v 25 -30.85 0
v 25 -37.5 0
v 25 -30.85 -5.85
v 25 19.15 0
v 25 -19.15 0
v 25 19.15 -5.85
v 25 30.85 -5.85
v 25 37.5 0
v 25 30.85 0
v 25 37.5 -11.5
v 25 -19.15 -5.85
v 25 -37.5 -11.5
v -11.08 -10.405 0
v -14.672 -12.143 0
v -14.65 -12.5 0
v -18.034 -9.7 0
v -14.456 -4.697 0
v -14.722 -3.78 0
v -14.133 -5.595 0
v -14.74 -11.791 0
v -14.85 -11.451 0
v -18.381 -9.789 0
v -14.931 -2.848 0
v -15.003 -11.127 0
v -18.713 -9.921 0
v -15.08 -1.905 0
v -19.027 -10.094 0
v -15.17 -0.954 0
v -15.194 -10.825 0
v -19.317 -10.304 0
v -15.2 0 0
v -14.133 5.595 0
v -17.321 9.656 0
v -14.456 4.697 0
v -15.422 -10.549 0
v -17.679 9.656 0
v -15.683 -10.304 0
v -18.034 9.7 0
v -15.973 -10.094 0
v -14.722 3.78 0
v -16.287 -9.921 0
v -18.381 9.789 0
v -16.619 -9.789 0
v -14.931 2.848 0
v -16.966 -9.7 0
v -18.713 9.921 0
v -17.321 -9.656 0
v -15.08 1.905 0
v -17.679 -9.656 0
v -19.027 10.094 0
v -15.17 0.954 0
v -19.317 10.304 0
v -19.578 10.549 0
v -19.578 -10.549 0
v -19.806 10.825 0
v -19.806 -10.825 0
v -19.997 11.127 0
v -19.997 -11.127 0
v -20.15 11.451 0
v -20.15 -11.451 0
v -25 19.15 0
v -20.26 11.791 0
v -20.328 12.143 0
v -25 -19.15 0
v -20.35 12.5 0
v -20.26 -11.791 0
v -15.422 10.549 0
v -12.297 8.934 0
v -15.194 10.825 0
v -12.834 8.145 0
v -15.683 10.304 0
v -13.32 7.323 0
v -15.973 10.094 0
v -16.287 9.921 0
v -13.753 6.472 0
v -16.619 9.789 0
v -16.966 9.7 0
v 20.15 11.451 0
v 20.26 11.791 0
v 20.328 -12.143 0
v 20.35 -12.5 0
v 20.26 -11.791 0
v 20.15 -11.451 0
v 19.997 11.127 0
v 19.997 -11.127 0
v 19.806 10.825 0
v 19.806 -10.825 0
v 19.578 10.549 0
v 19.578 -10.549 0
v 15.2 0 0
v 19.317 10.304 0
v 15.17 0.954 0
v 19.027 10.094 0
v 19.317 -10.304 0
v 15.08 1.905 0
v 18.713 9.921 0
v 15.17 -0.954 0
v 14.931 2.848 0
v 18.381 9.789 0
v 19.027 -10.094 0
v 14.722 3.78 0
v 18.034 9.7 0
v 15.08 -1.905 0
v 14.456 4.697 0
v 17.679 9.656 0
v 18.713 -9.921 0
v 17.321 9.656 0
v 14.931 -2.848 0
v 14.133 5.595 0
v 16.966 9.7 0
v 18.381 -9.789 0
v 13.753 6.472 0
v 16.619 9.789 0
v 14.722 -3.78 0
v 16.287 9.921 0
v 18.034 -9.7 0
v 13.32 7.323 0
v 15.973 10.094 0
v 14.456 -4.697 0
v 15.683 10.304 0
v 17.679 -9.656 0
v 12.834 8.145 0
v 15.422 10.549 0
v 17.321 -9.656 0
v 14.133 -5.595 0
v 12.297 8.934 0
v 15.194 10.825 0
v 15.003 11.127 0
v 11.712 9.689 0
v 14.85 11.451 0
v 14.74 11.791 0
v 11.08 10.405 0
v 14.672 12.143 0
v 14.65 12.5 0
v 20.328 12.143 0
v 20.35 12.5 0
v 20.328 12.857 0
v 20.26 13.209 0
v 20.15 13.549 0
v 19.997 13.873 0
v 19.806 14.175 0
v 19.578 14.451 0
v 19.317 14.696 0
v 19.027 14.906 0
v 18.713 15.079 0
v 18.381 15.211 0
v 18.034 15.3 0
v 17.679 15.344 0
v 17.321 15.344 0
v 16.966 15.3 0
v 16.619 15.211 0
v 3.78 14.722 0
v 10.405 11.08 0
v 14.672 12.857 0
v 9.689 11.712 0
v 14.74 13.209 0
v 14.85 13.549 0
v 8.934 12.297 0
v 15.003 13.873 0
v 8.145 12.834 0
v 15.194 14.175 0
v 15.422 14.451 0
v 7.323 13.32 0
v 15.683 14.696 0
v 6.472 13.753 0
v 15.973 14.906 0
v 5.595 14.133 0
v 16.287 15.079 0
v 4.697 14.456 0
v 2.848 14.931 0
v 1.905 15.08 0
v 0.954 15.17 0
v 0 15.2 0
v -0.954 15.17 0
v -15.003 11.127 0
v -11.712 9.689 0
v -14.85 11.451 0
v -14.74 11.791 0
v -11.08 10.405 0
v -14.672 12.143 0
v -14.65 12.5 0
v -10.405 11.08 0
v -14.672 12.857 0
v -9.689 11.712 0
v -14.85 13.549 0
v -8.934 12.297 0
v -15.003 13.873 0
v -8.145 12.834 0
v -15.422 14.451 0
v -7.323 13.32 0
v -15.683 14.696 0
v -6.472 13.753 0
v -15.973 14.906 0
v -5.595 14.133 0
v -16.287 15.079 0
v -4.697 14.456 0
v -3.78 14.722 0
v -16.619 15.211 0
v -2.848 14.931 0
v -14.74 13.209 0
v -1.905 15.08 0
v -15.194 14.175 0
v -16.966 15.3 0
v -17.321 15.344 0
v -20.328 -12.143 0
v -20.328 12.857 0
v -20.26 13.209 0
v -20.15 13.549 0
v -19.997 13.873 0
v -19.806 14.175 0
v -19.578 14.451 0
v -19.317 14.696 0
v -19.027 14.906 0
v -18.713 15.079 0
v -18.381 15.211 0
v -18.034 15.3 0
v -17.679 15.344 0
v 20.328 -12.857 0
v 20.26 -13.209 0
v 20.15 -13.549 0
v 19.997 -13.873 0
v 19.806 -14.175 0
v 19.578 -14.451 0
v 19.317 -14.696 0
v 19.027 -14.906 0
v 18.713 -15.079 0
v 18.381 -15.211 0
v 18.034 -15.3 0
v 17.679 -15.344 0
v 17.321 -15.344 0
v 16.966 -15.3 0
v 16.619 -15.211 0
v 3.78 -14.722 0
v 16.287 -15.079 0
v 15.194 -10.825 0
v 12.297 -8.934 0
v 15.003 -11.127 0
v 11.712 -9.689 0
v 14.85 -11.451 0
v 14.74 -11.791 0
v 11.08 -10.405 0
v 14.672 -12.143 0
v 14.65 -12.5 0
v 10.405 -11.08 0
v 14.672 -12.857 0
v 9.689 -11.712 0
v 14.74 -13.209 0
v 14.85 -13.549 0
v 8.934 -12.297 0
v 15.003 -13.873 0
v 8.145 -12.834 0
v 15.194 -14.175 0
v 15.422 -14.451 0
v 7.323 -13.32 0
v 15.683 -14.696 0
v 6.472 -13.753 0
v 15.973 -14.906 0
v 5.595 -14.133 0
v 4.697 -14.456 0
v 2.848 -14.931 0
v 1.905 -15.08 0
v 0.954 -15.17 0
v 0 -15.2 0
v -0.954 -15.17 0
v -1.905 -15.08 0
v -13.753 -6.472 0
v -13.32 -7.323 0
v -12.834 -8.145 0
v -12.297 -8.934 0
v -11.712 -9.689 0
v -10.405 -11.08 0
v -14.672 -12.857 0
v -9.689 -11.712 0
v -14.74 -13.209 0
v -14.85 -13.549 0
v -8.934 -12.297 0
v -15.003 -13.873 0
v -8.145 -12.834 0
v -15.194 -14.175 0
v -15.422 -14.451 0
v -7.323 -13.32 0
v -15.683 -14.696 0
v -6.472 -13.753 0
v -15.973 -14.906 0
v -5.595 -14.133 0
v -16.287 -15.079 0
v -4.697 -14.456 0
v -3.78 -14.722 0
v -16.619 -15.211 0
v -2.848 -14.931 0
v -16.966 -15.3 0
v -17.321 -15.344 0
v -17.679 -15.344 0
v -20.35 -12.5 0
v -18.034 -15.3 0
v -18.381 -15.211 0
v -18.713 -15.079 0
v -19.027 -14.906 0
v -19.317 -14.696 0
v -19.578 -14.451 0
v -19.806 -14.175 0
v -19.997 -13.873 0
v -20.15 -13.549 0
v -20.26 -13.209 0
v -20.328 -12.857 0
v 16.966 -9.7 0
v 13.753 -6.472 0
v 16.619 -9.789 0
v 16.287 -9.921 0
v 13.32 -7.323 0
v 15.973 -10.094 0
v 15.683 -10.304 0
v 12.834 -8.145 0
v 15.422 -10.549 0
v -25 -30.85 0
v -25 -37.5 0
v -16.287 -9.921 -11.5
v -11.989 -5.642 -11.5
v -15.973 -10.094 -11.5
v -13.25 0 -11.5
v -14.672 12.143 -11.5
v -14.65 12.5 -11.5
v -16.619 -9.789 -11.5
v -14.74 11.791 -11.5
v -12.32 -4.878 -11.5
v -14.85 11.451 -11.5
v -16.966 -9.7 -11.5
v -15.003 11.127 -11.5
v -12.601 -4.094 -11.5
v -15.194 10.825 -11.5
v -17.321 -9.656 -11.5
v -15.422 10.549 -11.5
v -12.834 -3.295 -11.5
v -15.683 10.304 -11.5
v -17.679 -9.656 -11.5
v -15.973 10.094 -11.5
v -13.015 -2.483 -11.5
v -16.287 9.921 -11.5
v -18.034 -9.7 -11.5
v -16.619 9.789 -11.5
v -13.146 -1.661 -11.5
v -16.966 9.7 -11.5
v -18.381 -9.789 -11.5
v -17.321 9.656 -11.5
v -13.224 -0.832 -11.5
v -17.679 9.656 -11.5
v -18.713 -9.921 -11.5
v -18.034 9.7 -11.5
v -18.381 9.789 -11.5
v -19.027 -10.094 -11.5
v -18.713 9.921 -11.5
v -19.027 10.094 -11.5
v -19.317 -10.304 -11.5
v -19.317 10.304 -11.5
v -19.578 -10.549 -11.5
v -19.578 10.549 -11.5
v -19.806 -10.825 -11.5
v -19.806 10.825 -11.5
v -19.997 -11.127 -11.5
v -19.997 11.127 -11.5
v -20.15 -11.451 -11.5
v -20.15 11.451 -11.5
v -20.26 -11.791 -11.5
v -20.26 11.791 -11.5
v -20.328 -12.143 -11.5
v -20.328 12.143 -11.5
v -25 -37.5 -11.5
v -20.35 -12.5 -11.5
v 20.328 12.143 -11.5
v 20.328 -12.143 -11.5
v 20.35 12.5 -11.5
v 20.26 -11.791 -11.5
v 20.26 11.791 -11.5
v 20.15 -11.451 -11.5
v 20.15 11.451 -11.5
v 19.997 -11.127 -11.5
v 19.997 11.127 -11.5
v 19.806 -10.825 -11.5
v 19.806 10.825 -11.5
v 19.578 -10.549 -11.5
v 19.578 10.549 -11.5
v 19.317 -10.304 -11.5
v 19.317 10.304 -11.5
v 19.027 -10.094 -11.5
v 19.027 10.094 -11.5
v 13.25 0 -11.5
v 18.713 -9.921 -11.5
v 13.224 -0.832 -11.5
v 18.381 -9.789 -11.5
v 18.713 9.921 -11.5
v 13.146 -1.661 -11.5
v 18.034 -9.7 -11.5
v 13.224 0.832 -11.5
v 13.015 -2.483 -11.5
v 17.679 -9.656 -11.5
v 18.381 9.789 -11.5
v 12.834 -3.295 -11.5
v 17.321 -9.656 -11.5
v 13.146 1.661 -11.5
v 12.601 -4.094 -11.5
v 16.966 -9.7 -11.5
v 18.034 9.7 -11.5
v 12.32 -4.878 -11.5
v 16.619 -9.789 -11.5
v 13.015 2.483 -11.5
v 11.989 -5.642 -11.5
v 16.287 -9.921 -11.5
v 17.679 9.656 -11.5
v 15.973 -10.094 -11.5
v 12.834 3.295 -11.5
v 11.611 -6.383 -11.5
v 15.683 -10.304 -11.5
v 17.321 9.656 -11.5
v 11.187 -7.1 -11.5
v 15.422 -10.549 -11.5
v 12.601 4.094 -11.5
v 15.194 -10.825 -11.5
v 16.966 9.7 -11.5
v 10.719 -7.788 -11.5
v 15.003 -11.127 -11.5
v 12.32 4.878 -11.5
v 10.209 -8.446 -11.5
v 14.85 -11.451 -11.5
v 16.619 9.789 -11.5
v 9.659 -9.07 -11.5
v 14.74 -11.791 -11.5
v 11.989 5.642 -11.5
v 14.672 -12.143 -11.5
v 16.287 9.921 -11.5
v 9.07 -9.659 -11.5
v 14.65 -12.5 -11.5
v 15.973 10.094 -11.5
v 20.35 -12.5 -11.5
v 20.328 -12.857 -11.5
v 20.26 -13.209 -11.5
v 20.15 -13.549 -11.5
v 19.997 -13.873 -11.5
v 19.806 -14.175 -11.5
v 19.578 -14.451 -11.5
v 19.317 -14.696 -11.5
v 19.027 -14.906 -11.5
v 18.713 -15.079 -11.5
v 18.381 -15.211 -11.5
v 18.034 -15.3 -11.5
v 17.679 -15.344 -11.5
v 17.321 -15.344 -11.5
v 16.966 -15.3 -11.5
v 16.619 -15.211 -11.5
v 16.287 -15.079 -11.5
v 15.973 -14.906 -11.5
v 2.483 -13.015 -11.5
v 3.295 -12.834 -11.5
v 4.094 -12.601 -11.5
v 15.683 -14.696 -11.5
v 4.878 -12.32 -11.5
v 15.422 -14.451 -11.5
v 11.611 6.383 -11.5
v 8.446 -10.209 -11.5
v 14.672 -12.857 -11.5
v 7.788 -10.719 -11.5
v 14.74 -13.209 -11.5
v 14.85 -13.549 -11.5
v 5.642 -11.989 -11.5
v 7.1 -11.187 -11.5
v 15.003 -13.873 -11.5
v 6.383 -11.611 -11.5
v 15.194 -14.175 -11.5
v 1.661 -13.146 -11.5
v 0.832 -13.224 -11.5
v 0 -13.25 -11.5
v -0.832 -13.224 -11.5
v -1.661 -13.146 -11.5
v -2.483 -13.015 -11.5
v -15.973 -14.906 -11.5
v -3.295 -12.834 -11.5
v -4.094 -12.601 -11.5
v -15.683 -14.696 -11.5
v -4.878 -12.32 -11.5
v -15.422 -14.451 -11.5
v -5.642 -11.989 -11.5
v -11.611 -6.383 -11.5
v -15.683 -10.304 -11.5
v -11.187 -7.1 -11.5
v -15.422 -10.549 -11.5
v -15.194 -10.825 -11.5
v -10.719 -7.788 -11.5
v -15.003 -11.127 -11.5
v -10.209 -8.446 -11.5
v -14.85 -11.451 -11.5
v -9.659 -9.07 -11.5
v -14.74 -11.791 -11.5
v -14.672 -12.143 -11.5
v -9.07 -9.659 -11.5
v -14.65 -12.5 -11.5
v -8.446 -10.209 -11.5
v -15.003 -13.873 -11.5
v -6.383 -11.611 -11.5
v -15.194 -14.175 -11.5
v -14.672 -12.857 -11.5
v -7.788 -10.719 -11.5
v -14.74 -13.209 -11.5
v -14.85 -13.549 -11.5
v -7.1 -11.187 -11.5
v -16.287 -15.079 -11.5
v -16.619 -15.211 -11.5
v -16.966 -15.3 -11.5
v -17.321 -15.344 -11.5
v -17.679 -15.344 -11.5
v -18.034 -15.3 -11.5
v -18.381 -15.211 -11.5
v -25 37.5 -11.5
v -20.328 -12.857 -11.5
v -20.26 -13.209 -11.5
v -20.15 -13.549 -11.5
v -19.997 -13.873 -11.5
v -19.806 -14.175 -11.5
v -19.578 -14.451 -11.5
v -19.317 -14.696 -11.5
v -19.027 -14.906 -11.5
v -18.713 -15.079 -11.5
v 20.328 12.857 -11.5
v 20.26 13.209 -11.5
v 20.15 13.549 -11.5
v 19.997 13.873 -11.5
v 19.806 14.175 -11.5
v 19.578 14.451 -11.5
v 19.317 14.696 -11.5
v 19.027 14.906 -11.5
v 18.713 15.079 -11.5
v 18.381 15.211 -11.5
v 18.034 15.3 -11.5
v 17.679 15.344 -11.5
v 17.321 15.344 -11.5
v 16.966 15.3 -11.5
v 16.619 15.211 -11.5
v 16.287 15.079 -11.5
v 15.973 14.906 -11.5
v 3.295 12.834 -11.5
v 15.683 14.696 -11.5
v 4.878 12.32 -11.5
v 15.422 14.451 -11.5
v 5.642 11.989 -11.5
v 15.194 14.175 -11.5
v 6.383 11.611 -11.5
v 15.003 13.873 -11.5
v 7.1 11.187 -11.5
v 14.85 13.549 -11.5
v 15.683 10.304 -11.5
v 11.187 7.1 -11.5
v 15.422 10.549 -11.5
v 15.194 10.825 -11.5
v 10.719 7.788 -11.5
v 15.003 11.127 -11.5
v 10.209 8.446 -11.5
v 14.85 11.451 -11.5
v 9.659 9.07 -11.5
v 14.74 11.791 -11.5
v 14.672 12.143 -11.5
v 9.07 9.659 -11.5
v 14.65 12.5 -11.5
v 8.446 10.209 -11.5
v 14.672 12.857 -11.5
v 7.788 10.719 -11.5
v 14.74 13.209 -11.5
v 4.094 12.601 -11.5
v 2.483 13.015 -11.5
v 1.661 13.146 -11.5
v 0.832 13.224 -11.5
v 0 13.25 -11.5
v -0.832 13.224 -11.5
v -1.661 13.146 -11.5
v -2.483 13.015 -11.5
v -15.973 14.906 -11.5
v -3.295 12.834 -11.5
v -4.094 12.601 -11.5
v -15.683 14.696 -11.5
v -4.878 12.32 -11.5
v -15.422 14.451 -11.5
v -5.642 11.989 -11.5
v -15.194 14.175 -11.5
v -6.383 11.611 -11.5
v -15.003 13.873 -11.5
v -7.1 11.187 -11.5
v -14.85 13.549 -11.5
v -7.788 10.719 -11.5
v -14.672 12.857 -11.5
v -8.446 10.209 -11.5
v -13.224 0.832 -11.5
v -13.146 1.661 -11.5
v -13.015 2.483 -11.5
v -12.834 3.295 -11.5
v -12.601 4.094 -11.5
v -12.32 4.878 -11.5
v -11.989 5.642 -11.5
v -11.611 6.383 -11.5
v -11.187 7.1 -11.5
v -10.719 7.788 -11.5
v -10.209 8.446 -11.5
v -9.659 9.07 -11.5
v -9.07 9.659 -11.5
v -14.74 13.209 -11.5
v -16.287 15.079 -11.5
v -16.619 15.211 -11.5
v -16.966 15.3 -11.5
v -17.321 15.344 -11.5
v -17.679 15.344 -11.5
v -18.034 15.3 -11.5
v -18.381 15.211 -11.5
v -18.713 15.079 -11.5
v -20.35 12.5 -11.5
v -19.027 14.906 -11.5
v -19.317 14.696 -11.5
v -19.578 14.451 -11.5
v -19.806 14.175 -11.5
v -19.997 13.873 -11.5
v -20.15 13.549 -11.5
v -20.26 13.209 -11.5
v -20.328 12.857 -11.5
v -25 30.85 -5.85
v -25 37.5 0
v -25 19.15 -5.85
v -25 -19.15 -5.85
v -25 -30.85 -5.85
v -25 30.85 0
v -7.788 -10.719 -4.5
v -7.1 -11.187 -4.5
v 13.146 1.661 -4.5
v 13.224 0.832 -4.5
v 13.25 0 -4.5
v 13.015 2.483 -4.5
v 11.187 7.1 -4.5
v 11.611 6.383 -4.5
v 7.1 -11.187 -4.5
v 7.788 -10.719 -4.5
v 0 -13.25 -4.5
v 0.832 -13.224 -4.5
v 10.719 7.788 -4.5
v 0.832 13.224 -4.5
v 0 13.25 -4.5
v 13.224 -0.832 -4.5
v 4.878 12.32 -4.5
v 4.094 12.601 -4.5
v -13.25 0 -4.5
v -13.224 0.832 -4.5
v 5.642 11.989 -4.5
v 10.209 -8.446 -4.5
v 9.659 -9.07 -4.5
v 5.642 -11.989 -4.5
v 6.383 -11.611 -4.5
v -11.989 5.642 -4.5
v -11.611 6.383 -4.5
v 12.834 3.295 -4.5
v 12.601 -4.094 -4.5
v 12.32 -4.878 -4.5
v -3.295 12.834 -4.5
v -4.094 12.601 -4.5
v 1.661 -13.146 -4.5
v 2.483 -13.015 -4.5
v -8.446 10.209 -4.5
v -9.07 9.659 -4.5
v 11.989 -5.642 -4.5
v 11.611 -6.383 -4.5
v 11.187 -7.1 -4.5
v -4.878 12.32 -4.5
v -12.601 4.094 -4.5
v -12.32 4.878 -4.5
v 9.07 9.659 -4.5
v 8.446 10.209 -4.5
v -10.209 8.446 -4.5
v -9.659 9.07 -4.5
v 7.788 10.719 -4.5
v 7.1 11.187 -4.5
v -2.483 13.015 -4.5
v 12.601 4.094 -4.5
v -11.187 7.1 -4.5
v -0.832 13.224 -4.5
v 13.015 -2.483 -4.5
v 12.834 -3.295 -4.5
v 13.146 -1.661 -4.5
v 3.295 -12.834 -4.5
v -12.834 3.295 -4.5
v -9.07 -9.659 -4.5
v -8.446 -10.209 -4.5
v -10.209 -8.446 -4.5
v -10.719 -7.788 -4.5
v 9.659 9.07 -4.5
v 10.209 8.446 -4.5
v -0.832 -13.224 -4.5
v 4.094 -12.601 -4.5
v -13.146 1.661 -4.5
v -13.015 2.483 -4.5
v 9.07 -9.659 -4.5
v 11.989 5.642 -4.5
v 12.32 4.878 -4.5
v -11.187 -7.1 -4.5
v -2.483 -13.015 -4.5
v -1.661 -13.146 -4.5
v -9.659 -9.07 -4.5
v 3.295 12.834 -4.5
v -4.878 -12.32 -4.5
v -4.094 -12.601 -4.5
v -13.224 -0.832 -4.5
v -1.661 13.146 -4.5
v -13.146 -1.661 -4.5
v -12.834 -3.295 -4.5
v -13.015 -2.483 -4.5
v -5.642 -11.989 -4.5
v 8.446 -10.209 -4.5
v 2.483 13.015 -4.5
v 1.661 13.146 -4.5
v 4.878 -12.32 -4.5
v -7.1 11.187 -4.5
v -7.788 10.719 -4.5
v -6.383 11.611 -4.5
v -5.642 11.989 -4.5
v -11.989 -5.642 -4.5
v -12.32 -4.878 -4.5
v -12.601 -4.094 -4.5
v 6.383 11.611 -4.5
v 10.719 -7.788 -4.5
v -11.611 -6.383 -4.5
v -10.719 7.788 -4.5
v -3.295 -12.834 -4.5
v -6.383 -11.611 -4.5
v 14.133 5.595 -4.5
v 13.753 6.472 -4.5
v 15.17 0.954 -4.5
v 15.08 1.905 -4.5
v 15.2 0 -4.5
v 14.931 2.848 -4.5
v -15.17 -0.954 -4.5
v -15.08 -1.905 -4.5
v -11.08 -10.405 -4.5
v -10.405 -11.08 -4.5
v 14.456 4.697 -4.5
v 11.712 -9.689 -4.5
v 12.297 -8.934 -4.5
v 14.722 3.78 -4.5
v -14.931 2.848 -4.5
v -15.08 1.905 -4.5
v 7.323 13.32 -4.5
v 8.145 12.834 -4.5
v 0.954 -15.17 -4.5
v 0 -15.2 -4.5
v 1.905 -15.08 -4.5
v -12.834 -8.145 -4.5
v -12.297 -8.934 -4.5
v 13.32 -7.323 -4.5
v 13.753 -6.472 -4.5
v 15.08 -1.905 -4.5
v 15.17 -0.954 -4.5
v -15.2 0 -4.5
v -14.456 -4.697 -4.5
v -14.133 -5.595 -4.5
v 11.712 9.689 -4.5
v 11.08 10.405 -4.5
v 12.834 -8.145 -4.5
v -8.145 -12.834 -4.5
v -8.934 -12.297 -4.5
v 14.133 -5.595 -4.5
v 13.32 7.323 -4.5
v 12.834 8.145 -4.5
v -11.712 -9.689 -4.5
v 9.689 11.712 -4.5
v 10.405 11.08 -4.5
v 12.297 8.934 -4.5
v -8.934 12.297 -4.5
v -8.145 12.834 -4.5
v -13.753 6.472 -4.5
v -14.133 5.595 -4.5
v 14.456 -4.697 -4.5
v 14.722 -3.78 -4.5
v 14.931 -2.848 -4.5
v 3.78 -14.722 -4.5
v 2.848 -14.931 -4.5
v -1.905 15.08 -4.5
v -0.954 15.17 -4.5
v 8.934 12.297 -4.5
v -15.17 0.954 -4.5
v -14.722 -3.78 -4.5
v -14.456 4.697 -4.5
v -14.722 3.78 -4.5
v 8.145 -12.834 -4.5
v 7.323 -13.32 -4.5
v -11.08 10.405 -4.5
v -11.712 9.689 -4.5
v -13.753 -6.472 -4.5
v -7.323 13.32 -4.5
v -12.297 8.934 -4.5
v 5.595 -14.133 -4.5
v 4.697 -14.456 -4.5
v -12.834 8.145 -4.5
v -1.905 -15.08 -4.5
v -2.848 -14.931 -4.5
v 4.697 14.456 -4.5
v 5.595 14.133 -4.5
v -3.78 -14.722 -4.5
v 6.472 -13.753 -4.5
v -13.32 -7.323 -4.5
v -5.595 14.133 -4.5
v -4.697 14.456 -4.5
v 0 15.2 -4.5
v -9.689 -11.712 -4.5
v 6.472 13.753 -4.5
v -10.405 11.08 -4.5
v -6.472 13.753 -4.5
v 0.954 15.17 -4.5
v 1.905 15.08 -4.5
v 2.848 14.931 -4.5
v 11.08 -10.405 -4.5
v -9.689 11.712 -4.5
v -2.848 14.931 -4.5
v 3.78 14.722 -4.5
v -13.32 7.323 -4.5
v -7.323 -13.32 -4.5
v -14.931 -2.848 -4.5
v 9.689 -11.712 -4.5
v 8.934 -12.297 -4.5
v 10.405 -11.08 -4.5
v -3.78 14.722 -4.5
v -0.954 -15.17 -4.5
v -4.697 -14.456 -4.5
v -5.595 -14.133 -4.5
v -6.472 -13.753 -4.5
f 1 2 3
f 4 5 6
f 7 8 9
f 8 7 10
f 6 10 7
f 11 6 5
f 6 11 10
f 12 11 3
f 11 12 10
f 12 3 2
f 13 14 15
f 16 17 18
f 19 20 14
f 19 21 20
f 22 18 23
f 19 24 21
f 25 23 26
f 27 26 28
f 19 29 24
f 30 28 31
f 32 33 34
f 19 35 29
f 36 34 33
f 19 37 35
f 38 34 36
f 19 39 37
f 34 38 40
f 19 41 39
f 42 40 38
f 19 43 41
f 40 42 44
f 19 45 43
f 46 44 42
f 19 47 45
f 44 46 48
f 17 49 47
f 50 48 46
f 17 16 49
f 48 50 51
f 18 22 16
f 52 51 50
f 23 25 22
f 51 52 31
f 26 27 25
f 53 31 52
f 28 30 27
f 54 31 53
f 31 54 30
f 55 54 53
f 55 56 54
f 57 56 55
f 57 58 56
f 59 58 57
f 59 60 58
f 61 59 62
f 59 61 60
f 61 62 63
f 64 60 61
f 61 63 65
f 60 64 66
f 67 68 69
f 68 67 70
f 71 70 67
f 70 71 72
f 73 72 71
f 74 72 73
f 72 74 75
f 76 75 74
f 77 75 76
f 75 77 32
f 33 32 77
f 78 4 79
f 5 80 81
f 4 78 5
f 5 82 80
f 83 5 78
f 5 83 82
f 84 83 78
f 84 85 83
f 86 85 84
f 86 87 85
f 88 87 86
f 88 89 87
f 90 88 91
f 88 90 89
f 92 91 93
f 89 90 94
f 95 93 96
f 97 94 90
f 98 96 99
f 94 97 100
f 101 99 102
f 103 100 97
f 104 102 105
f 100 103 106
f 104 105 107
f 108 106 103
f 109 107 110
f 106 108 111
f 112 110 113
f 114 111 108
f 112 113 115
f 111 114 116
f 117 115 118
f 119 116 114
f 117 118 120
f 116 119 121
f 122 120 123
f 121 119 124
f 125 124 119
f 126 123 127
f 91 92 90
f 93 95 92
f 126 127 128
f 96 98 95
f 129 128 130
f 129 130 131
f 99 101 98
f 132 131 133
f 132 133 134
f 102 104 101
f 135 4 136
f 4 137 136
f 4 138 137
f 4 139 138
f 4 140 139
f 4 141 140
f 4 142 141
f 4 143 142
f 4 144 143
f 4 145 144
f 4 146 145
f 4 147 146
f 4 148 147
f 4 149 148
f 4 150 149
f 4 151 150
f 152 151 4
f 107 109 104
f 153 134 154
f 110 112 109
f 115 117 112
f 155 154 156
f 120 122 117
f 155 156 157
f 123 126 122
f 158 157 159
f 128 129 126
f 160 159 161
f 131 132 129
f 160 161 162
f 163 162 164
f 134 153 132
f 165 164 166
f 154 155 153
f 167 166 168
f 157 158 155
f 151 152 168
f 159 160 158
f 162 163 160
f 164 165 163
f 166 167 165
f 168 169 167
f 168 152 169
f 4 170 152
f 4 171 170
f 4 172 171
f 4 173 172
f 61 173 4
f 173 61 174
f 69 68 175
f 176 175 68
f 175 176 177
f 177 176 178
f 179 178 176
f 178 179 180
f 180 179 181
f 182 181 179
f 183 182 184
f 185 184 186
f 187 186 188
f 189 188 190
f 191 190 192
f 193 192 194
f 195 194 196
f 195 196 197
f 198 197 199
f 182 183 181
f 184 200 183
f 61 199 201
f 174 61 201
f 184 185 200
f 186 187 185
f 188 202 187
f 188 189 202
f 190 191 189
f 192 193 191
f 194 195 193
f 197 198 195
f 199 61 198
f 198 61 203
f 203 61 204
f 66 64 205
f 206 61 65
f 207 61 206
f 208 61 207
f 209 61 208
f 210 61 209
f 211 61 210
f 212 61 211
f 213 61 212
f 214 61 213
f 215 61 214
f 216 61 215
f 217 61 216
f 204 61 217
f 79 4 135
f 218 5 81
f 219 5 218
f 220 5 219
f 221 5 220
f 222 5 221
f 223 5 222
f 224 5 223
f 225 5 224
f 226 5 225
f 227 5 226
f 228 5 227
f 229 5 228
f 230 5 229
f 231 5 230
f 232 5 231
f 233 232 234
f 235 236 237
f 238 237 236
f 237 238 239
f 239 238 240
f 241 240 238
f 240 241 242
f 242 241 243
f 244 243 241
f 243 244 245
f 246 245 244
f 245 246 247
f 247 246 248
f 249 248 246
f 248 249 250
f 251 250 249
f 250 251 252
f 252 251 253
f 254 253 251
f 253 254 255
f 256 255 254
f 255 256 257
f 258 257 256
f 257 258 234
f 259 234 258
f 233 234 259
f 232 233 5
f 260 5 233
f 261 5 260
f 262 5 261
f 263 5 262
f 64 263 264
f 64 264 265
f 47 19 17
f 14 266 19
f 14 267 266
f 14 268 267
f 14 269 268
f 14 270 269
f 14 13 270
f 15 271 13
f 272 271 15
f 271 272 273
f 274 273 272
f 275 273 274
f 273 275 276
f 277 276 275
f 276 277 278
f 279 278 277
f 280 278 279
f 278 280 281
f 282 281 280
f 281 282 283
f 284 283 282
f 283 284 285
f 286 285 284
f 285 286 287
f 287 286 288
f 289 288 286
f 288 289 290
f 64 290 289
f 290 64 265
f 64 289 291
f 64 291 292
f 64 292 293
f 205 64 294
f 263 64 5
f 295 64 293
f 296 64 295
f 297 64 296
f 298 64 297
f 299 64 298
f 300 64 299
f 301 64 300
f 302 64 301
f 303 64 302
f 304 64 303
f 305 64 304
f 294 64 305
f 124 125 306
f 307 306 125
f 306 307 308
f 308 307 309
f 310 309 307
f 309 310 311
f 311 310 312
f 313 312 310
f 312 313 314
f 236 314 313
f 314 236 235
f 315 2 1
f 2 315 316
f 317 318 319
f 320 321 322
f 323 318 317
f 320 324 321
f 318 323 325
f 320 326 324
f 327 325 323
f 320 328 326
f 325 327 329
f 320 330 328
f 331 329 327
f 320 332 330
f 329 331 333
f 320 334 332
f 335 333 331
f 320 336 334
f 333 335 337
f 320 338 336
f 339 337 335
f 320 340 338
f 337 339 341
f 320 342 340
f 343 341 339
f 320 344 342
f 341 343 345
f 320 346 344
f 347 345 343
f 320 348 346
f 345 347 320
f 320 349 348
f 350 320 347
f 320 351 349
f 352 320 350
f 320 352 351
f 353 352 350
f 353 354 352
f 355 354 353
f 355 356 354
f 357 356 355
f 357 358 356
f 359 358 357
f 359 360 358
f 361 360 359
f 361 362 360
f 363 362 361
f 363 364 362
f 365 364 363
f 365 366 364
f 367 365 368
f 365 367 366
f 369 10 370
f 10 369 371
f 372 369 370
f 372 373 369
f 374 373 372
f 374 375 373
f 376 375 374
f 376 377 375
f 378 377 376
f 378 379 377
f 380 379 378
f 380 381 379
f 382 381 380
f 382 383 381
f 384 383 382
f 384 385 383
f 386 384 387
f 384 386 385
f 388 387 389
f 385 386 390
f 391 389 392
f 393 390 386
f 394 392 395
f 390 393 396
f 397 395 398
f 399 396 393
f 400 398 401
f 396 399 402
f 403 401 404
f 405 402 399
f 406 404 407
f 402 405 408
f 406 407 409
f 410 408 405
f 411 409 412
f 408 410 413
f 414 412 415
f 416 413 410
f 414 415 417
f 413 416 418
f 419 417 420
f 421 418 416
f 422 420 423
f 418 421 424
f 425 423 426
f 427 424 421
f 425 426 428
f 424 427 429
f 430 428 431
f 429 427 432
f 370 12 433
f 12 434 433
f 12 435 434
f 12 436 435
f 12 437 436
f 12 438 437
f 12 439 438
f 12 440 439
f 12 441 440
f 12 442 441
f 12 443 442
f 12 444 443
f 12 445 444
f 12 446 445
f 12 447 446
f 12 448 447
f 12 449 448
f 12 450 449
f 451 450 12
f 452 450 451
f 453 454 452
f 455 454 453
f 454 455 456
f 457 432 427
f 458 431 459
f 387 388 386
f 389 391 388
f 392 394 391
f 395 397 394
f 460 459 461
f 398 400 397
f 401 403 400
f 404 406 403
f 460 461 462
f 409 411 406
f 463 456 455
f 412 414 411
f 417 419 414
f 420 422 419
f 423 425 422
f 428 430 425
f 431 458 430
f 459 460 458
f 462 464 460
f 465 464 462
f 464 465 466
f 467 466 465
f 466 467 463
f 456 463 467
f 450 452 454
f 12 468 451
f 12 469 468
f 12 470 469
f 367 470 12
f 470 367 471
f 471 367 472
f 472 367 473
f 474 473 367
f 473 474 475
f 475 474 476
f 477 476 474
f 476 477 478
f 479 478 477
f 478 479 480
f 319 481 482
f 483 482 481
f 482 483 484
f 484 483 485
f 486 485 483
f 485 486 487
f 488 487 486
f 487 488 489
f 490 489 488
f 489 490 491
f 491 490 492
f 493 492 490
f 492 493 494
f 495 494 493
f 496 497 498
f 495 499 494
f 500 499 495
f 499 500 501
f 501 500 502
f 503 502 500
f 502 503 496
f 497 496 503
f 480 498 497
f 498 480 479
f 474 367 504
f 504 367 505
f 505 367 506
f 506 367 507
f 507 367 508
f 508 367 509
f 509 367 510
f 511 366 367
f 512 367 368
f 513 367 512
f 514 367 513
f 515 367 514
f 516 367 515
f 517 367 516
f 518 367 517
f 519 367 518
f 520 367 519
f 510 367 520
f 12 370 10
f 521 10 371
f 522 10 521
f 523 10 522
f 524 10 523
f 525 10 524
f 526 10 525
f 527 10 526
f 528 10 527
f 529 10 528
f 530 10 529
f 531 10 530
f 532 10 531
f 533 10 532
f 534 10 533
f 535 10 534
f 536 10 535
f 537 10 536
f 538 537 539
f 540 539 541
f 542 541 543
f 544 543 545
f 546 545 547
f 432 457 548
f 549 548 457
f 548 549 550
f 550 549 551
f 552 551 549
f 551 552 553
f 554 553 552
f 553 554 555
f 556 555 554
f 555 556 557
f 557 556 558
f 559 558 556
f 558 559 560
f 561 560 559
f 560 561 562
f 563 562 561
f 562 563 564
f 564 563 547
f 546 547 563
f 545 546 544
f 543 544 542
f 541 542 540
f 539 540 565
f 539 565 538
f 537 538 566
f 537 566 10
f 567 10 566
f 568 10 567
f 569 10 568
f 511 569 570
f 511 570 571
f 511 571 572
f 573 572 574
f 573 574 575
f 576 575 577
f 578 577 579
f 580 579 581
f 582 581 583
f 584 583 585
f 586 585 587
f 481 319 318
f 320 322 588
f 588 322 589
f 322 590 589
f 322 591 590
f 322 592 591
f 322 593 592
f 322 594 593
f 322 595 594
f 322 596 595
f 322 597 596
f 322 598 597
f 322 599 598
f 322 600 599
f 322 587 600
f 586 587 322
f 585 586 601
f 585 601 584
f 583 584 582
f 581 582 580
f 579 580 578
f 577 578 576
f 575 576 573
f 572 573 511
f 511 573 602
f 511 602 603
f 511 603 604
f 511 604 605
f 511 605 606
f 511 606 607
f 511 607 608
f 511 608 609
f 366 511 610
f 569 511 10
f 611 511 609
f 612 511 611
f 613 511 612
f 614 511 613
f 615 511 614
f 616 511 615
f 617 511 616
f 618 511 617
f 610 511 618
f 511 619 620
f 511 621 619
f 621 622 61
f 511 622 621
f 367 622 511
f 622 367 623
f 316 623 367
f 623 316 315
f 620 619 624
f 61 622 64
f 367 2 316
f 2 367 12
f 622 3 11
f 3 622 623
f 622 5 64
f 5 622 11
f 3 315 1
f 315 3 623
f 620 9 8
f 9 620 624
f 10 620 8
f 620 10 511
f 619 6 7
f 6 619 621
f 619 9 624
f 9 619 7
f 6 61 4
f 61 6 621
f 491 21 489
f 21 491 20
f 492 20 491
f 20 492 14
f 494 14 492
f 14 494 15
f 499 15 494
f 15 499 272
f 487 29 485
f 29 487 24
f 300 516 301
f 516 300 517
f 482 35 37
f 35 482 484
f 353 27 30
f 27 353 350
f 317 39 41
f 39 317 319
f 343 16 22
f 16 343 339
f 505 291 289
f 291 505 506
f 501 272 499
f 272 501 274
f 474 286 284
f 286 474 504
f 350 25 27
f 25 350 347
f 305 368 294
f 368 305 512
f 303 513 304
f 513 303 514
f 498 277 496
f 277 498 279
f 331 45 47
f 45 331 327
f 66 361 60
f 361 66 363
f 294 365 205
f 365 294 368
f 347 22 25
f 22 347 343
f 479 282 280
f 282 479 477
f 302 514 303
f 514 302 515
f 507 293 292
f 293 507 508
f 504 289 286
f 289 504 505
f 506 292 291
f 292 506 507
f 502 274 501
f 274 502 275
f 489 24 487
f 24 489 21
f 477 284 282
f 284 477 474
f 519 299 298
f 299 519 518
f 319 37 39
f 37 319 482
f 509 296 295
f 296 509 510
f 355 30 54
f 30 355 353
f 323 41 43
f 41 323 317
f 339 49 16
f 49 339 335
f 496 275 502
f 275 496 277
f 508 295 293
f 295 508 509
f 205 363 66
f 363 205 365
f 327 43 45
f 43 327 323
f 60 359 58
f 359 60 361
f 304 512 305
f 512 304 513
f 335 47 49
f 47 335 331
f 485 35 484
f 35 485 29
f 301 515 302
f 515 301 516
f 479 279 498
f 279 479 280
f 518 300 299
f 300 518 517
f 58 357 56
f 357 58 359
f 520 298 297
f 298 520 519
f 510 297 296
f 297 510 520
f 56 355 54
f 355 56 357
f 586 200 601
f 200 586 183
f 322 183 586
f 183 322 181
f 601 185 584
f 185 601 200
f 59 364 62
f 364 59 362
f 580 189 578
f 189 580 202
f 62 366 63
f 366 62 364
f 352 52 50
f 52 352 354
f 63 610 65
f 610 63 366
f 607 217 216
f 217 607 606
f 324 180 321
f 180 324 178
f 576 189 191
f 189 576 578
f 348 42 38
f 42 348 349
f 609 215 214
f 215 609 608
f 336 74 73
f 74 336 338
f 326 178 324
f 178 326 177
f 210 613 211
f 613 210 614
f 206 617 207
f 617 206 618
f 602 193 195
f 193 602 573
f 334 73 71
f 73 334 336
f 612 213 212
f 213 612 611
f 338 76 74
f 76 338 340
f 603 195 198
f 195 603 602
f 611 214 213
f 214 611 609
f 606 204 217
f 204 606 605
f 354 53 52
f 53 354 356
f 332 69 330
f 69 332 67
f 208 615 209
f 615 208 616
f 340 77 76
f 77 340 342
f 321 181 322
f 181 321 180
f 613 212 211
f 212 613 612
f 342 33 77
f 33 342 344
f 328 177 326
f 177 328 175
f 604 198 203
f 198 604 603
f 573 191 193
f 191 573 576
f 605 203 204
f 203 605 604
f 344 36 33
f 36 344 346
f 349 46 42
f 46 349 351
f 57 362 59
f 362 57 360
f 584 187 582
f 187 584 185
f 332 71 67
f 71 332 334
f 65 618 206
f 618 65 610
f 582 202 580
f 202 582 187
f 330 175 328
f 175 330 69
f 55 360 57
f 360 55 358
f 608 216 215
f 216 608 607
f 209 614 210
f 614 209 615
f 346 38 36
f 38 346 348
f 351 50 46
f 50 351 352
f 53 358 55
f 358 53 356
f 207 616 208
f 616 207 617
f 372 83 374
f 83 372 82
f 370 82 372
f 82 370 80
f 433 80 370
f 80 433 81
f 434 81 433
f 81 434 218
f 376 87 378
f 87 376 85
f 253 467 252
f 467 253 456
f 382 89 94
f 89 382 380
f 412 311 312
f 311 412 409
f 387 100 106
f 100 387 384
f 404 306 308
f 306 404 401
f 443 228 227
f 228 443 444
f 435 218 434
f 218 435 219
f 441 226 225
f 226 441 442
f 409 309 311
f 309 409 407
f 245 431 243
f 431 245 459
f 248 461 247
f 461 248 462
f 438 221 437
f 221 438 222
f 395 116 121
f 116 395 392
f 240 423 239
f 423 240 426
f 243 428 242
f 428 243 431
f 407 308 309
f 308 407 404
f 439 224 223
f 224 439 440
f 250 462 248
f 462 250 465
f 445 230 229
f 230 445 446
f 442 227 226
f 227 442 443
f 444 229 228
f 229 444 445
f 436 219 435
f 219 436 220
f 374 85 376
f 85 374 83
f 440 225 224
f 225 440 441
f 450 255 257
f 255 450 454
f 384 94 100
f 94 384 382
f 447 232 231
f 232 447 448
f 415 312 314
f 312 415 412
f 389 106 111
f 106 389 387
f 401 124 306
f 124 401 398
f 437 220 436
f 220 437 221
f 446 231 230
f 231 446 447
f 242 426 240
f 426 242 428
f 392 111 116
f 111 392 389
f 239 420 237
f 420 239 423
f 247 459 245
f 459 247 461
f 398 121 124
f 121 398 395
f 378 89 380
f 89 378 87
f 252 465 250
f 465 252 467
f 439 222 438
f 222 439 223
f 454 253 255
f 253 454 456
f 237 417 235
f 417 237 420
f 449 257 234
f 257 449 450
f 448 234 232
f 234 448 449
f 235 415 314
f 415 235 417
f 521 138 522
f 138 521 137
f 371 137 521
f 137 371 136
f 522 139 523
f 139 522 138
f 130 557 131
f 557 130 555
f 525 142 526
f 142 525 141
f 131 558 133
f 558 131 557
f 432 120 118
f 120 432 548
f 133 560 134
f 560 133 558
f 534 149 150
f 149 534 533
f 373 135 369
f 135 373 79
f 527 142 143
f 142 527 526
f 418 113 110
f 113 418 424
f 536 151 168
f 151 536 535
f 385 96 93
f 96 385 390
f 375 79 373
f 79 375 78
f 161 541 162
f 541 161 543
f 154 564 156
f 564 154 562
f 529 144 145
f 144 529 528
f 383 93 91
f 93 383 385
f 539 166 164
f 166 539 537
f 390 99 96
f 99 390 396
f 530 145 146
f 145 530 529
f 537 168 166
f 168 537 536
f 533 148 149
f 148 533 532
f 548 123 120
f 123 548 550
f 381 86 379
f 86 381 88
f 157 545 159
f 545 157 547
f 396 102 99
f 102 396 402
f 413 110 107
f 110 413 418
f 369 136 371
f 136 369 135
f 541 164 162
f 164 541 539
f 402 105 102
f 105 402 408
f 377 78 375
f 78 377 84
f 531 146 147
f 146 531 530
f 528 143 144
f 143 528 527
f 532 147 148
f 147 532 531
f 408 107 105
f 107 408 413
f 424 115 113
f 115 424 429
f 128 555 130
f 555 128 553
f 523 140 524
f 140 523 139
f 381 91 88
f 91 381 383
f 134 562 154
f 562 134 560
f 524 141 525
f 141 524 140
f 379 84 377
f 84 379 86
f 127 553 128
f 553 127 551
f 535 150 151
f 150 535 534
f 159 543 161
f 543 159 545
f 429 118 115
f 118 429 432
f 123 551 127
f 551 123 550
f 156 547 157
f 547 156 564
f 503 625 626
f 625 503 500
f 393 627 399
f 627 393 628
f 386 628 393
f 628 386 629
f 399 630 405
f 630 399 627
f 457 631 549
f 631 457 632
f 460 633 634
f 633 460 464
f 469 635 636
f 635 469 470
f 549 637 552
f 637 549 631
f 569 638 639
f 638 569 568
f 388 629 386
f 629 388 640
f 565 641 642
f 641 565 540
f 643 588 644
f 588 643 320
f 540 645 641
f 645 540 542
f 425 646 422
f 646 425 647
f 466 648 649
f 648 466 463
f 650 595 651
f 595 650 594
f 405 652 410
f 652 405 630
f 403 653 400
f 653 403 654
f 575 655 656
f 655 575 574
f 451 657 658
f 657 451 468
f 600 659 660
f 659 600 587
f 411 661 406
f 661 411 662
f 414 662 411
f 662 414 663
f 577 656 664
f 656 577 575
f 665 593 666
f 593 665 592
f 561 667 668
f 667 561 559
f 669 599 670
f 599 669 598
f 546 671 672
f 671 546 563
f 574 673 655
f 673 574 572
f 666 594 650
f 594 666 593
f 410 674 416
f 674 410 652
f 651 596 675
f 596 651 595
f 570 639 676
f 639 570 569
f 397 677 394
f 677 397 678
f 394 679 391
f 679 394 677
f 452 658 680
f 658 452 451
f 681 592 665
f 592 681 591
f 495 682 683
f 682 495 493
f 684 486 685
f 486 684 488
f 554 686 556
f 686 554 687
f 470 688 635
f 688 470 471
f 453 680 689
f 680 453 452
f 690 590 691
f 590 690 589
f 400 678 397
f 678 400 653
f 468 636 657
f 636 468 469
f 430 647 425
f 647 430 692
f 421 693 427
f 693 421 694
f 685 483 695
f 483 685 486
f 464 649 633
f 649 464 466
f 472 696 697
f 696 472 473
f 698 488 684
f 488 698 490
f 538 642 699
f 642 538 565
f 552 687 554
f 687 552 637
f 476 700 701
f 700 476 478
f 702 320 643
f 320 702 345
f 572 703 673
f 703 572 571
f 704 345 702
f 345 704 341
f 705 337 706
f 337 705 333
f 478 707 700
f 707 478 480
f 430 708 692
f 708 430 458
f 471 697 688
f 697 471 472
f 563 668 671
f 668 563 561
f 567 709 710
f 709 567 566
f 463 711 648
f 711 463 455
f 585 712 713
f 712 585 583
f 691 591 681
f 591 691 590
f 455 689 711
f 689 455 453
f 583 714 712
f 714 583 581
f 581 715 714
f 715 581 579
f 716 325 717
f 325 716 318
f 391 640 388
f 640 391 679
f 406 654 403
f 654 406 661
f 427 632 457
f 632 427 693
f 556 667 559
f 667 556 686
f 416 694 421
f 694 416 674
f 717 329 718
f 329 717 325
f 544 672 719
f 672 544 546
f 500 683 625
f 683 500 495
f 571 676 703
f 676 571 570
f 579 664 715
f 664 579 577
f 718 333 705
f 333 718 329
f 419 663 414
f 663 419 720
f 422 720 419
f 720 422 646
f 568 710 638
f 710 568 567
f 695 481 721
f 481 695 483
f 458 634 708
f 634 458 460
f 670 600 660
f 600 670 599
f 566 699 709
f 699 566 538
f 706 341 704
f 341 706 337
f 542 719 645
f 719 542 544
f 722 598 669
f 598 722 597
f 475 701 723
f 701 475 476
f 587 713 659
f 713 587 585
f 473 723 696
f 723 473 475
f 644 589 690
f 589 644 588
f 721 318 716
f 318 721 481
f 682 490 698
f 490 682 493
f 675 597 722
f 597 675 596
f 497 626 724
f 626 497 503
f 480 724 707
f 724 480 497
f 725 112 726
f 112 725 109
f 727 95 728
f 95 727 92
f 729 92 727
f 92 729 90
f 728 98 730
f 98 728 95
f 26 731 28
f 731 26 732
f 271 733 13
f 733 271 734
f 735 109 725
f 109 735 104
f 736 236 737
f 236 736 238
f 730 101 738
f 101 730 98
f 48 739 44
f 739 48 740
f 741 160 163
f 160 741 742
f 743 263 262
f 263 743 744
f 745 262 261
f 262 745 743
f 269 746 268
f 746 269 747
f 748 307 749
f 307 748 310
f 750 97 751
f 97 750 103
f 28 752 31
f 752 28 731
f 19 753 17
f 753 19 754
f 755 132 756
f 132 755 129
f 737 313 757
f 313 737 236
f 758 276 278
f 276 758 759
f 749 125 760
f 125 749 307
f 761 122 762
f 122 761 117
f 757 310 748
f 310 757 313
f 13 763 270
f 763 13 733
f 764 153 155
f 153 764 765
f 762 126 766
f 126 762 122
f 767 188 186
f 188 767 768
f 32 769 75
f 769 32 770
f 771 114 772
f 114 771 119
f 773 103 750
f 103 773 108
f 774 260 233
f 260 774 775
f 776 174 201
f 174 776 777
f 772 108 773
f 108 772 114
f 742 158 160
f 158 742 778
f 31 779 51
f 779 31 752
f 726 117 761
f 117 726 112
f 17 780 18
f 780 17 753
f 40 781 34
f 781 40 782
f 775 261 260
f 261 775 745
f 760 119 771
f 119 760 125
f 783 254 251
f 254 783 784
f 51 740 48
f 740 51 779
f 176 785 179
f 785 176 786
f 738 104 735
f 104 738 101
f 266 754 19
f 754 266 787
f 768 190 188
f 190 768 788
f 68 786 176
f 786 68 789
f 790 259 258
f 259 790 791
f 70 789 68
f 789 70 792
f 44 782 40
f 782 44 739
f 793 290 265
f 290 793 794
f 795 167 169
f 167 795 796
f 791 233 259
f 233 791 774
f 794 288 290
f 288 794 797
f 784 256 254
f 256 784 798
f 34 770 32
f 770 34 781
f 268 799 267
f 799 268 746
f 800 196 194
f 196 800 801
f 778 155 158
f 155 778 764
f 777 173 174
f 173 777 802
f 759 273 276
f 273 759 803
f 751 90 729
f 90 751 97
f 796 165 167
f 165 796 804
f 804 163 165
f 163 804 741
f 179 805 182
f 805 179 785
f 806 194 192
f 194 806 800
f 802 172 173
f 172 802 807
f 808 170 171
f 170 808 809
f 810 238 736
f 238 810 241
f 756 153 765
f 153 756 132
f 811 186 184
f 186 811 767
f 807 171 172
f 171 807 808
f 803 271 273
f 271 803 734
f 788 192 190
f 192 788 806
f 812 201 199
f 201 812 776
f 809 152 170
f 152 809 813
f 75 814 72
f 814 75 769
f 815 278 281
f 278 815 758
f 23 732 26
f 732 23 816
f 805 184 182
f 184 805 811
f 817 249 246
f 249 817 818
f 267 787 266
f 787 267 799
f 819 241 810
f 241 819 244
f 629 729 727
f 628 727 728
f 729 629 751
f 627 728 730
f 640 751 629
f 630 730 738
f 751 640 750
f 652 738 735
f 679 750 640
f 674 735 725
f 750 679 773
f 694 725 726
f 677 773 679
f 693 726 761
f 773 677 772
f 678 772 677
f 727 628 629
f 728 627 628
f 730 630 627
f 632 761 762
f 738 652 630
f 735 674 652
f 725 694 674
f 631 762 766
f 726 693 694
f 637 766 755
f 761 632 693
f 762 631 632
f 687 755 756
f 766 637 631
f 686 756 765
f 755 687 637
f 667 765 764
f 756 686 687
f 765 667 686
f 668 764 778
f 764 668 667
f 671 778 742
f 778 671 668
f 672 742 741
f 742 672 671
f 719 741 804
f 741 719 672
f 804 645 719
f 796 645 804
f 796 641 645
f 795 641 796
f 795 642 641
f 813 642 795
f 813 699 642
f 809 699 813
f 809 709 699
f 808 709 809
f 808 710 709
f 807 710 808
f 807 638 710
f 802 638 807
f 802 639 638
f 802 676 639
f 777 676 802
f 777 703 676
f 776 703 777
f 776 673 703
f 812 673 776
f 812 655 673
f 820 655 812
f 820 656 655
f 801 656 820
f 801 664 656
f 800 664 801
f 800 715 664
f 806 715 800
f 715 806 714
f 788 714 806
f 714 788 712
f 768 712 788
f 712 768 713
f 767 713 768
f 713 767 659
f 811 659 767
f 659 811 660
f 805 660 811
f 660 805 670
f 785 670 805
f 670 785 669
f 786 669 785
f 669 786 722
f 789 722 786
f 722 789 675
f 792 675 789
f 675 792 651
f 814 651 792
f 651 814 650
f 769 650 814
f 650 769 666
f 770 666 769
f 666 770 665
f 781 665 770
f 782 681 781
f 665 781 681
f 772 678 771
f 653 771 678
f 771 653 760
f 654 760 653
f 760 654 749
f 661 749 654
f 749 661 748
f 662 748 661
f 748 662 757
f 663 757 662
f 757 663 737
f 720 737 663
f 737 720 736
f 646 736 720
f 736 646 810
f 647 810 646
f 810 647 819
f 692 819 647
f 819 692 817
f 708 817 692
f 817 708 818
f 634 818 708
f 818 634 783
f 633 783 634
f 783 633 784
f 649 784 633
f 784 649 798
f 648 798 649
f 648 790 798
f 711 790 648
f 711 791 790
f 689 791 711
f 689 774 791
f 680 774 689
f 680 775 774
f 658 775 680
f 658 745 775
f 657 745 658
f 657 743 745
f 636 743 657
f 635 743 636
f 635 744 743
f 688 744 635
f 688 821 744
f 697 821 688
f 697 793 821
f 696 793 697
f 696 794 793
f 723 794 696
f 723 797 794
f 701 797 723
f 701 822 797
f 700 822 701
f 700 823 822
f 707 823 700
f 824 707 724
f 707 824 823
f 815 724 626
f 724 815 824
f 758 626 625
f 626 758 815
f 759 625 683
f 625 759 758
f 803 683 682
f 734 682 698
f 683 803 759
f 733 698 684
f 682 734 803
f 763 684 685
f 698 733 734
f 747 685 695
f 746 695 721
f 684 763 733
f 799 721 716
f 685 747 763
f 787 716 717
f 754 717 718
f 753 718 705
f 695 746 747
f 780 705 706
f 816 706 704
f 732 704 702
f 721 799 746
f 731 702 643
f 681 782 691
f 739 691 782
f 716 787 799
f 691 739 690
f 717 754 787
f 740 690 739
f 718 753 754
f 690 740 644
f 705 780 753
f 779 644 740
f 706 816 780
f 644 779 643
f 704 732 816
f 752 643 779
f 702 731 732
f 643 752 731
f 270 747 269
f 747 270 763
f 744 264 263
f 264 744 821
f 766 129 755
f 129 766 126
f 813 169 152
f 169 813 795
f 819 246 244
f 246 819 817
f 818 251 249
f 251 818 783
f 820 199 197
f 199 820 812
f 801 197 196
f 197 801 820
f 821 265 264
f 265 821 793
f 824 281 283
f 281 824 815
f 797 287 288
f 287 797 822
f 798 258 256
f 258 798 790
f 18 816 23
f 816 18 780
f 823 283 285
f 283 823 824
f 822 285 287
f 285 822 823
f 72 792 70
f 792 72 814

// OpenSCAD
stab_d = 11.7;
blockh = 23;

module klemmteil() {
	translate([0,0,-blockh/4]) difference() {
		cube([50, 25, blockh/2], true);
		translate([0,0, blockh/4]) cube([100, stab_d, stab_d], true);
	}
}

difference() {
	union() {
		translate([0, -50/2, 0]) klemmteil();
		translate([0, +50/2, 0]) klemmteil();
		translate([0,0,-blockh/4]) cube([50, 25, blockh/2], true);
		// translate([0, +50/2 + 25/2 + 10/2, -blockh/4]) cube([50, 10, blockh/2], true);
		//translate([0, -50/2 - 25/2 - 10/2, -blockh/4]) cube([50, 10, blockh/2], true);
	}
	cylinder(h=100, r=26.5/2, $fn=100, center=true);
	cylinder(h=9, r=30.4/2, $fn=100, center=true);
	for (x = [-17.5, +17.5]) {
		for (y = [/* 50/2 + 25/2 + 2, -50/2 - 25/2 - 2,*/  -25/2, +25/2]) {
			translate([x, y, 0]) cylinder(h=100, r=5.7/2, $fn=50, center=true);
		}
	}
}
